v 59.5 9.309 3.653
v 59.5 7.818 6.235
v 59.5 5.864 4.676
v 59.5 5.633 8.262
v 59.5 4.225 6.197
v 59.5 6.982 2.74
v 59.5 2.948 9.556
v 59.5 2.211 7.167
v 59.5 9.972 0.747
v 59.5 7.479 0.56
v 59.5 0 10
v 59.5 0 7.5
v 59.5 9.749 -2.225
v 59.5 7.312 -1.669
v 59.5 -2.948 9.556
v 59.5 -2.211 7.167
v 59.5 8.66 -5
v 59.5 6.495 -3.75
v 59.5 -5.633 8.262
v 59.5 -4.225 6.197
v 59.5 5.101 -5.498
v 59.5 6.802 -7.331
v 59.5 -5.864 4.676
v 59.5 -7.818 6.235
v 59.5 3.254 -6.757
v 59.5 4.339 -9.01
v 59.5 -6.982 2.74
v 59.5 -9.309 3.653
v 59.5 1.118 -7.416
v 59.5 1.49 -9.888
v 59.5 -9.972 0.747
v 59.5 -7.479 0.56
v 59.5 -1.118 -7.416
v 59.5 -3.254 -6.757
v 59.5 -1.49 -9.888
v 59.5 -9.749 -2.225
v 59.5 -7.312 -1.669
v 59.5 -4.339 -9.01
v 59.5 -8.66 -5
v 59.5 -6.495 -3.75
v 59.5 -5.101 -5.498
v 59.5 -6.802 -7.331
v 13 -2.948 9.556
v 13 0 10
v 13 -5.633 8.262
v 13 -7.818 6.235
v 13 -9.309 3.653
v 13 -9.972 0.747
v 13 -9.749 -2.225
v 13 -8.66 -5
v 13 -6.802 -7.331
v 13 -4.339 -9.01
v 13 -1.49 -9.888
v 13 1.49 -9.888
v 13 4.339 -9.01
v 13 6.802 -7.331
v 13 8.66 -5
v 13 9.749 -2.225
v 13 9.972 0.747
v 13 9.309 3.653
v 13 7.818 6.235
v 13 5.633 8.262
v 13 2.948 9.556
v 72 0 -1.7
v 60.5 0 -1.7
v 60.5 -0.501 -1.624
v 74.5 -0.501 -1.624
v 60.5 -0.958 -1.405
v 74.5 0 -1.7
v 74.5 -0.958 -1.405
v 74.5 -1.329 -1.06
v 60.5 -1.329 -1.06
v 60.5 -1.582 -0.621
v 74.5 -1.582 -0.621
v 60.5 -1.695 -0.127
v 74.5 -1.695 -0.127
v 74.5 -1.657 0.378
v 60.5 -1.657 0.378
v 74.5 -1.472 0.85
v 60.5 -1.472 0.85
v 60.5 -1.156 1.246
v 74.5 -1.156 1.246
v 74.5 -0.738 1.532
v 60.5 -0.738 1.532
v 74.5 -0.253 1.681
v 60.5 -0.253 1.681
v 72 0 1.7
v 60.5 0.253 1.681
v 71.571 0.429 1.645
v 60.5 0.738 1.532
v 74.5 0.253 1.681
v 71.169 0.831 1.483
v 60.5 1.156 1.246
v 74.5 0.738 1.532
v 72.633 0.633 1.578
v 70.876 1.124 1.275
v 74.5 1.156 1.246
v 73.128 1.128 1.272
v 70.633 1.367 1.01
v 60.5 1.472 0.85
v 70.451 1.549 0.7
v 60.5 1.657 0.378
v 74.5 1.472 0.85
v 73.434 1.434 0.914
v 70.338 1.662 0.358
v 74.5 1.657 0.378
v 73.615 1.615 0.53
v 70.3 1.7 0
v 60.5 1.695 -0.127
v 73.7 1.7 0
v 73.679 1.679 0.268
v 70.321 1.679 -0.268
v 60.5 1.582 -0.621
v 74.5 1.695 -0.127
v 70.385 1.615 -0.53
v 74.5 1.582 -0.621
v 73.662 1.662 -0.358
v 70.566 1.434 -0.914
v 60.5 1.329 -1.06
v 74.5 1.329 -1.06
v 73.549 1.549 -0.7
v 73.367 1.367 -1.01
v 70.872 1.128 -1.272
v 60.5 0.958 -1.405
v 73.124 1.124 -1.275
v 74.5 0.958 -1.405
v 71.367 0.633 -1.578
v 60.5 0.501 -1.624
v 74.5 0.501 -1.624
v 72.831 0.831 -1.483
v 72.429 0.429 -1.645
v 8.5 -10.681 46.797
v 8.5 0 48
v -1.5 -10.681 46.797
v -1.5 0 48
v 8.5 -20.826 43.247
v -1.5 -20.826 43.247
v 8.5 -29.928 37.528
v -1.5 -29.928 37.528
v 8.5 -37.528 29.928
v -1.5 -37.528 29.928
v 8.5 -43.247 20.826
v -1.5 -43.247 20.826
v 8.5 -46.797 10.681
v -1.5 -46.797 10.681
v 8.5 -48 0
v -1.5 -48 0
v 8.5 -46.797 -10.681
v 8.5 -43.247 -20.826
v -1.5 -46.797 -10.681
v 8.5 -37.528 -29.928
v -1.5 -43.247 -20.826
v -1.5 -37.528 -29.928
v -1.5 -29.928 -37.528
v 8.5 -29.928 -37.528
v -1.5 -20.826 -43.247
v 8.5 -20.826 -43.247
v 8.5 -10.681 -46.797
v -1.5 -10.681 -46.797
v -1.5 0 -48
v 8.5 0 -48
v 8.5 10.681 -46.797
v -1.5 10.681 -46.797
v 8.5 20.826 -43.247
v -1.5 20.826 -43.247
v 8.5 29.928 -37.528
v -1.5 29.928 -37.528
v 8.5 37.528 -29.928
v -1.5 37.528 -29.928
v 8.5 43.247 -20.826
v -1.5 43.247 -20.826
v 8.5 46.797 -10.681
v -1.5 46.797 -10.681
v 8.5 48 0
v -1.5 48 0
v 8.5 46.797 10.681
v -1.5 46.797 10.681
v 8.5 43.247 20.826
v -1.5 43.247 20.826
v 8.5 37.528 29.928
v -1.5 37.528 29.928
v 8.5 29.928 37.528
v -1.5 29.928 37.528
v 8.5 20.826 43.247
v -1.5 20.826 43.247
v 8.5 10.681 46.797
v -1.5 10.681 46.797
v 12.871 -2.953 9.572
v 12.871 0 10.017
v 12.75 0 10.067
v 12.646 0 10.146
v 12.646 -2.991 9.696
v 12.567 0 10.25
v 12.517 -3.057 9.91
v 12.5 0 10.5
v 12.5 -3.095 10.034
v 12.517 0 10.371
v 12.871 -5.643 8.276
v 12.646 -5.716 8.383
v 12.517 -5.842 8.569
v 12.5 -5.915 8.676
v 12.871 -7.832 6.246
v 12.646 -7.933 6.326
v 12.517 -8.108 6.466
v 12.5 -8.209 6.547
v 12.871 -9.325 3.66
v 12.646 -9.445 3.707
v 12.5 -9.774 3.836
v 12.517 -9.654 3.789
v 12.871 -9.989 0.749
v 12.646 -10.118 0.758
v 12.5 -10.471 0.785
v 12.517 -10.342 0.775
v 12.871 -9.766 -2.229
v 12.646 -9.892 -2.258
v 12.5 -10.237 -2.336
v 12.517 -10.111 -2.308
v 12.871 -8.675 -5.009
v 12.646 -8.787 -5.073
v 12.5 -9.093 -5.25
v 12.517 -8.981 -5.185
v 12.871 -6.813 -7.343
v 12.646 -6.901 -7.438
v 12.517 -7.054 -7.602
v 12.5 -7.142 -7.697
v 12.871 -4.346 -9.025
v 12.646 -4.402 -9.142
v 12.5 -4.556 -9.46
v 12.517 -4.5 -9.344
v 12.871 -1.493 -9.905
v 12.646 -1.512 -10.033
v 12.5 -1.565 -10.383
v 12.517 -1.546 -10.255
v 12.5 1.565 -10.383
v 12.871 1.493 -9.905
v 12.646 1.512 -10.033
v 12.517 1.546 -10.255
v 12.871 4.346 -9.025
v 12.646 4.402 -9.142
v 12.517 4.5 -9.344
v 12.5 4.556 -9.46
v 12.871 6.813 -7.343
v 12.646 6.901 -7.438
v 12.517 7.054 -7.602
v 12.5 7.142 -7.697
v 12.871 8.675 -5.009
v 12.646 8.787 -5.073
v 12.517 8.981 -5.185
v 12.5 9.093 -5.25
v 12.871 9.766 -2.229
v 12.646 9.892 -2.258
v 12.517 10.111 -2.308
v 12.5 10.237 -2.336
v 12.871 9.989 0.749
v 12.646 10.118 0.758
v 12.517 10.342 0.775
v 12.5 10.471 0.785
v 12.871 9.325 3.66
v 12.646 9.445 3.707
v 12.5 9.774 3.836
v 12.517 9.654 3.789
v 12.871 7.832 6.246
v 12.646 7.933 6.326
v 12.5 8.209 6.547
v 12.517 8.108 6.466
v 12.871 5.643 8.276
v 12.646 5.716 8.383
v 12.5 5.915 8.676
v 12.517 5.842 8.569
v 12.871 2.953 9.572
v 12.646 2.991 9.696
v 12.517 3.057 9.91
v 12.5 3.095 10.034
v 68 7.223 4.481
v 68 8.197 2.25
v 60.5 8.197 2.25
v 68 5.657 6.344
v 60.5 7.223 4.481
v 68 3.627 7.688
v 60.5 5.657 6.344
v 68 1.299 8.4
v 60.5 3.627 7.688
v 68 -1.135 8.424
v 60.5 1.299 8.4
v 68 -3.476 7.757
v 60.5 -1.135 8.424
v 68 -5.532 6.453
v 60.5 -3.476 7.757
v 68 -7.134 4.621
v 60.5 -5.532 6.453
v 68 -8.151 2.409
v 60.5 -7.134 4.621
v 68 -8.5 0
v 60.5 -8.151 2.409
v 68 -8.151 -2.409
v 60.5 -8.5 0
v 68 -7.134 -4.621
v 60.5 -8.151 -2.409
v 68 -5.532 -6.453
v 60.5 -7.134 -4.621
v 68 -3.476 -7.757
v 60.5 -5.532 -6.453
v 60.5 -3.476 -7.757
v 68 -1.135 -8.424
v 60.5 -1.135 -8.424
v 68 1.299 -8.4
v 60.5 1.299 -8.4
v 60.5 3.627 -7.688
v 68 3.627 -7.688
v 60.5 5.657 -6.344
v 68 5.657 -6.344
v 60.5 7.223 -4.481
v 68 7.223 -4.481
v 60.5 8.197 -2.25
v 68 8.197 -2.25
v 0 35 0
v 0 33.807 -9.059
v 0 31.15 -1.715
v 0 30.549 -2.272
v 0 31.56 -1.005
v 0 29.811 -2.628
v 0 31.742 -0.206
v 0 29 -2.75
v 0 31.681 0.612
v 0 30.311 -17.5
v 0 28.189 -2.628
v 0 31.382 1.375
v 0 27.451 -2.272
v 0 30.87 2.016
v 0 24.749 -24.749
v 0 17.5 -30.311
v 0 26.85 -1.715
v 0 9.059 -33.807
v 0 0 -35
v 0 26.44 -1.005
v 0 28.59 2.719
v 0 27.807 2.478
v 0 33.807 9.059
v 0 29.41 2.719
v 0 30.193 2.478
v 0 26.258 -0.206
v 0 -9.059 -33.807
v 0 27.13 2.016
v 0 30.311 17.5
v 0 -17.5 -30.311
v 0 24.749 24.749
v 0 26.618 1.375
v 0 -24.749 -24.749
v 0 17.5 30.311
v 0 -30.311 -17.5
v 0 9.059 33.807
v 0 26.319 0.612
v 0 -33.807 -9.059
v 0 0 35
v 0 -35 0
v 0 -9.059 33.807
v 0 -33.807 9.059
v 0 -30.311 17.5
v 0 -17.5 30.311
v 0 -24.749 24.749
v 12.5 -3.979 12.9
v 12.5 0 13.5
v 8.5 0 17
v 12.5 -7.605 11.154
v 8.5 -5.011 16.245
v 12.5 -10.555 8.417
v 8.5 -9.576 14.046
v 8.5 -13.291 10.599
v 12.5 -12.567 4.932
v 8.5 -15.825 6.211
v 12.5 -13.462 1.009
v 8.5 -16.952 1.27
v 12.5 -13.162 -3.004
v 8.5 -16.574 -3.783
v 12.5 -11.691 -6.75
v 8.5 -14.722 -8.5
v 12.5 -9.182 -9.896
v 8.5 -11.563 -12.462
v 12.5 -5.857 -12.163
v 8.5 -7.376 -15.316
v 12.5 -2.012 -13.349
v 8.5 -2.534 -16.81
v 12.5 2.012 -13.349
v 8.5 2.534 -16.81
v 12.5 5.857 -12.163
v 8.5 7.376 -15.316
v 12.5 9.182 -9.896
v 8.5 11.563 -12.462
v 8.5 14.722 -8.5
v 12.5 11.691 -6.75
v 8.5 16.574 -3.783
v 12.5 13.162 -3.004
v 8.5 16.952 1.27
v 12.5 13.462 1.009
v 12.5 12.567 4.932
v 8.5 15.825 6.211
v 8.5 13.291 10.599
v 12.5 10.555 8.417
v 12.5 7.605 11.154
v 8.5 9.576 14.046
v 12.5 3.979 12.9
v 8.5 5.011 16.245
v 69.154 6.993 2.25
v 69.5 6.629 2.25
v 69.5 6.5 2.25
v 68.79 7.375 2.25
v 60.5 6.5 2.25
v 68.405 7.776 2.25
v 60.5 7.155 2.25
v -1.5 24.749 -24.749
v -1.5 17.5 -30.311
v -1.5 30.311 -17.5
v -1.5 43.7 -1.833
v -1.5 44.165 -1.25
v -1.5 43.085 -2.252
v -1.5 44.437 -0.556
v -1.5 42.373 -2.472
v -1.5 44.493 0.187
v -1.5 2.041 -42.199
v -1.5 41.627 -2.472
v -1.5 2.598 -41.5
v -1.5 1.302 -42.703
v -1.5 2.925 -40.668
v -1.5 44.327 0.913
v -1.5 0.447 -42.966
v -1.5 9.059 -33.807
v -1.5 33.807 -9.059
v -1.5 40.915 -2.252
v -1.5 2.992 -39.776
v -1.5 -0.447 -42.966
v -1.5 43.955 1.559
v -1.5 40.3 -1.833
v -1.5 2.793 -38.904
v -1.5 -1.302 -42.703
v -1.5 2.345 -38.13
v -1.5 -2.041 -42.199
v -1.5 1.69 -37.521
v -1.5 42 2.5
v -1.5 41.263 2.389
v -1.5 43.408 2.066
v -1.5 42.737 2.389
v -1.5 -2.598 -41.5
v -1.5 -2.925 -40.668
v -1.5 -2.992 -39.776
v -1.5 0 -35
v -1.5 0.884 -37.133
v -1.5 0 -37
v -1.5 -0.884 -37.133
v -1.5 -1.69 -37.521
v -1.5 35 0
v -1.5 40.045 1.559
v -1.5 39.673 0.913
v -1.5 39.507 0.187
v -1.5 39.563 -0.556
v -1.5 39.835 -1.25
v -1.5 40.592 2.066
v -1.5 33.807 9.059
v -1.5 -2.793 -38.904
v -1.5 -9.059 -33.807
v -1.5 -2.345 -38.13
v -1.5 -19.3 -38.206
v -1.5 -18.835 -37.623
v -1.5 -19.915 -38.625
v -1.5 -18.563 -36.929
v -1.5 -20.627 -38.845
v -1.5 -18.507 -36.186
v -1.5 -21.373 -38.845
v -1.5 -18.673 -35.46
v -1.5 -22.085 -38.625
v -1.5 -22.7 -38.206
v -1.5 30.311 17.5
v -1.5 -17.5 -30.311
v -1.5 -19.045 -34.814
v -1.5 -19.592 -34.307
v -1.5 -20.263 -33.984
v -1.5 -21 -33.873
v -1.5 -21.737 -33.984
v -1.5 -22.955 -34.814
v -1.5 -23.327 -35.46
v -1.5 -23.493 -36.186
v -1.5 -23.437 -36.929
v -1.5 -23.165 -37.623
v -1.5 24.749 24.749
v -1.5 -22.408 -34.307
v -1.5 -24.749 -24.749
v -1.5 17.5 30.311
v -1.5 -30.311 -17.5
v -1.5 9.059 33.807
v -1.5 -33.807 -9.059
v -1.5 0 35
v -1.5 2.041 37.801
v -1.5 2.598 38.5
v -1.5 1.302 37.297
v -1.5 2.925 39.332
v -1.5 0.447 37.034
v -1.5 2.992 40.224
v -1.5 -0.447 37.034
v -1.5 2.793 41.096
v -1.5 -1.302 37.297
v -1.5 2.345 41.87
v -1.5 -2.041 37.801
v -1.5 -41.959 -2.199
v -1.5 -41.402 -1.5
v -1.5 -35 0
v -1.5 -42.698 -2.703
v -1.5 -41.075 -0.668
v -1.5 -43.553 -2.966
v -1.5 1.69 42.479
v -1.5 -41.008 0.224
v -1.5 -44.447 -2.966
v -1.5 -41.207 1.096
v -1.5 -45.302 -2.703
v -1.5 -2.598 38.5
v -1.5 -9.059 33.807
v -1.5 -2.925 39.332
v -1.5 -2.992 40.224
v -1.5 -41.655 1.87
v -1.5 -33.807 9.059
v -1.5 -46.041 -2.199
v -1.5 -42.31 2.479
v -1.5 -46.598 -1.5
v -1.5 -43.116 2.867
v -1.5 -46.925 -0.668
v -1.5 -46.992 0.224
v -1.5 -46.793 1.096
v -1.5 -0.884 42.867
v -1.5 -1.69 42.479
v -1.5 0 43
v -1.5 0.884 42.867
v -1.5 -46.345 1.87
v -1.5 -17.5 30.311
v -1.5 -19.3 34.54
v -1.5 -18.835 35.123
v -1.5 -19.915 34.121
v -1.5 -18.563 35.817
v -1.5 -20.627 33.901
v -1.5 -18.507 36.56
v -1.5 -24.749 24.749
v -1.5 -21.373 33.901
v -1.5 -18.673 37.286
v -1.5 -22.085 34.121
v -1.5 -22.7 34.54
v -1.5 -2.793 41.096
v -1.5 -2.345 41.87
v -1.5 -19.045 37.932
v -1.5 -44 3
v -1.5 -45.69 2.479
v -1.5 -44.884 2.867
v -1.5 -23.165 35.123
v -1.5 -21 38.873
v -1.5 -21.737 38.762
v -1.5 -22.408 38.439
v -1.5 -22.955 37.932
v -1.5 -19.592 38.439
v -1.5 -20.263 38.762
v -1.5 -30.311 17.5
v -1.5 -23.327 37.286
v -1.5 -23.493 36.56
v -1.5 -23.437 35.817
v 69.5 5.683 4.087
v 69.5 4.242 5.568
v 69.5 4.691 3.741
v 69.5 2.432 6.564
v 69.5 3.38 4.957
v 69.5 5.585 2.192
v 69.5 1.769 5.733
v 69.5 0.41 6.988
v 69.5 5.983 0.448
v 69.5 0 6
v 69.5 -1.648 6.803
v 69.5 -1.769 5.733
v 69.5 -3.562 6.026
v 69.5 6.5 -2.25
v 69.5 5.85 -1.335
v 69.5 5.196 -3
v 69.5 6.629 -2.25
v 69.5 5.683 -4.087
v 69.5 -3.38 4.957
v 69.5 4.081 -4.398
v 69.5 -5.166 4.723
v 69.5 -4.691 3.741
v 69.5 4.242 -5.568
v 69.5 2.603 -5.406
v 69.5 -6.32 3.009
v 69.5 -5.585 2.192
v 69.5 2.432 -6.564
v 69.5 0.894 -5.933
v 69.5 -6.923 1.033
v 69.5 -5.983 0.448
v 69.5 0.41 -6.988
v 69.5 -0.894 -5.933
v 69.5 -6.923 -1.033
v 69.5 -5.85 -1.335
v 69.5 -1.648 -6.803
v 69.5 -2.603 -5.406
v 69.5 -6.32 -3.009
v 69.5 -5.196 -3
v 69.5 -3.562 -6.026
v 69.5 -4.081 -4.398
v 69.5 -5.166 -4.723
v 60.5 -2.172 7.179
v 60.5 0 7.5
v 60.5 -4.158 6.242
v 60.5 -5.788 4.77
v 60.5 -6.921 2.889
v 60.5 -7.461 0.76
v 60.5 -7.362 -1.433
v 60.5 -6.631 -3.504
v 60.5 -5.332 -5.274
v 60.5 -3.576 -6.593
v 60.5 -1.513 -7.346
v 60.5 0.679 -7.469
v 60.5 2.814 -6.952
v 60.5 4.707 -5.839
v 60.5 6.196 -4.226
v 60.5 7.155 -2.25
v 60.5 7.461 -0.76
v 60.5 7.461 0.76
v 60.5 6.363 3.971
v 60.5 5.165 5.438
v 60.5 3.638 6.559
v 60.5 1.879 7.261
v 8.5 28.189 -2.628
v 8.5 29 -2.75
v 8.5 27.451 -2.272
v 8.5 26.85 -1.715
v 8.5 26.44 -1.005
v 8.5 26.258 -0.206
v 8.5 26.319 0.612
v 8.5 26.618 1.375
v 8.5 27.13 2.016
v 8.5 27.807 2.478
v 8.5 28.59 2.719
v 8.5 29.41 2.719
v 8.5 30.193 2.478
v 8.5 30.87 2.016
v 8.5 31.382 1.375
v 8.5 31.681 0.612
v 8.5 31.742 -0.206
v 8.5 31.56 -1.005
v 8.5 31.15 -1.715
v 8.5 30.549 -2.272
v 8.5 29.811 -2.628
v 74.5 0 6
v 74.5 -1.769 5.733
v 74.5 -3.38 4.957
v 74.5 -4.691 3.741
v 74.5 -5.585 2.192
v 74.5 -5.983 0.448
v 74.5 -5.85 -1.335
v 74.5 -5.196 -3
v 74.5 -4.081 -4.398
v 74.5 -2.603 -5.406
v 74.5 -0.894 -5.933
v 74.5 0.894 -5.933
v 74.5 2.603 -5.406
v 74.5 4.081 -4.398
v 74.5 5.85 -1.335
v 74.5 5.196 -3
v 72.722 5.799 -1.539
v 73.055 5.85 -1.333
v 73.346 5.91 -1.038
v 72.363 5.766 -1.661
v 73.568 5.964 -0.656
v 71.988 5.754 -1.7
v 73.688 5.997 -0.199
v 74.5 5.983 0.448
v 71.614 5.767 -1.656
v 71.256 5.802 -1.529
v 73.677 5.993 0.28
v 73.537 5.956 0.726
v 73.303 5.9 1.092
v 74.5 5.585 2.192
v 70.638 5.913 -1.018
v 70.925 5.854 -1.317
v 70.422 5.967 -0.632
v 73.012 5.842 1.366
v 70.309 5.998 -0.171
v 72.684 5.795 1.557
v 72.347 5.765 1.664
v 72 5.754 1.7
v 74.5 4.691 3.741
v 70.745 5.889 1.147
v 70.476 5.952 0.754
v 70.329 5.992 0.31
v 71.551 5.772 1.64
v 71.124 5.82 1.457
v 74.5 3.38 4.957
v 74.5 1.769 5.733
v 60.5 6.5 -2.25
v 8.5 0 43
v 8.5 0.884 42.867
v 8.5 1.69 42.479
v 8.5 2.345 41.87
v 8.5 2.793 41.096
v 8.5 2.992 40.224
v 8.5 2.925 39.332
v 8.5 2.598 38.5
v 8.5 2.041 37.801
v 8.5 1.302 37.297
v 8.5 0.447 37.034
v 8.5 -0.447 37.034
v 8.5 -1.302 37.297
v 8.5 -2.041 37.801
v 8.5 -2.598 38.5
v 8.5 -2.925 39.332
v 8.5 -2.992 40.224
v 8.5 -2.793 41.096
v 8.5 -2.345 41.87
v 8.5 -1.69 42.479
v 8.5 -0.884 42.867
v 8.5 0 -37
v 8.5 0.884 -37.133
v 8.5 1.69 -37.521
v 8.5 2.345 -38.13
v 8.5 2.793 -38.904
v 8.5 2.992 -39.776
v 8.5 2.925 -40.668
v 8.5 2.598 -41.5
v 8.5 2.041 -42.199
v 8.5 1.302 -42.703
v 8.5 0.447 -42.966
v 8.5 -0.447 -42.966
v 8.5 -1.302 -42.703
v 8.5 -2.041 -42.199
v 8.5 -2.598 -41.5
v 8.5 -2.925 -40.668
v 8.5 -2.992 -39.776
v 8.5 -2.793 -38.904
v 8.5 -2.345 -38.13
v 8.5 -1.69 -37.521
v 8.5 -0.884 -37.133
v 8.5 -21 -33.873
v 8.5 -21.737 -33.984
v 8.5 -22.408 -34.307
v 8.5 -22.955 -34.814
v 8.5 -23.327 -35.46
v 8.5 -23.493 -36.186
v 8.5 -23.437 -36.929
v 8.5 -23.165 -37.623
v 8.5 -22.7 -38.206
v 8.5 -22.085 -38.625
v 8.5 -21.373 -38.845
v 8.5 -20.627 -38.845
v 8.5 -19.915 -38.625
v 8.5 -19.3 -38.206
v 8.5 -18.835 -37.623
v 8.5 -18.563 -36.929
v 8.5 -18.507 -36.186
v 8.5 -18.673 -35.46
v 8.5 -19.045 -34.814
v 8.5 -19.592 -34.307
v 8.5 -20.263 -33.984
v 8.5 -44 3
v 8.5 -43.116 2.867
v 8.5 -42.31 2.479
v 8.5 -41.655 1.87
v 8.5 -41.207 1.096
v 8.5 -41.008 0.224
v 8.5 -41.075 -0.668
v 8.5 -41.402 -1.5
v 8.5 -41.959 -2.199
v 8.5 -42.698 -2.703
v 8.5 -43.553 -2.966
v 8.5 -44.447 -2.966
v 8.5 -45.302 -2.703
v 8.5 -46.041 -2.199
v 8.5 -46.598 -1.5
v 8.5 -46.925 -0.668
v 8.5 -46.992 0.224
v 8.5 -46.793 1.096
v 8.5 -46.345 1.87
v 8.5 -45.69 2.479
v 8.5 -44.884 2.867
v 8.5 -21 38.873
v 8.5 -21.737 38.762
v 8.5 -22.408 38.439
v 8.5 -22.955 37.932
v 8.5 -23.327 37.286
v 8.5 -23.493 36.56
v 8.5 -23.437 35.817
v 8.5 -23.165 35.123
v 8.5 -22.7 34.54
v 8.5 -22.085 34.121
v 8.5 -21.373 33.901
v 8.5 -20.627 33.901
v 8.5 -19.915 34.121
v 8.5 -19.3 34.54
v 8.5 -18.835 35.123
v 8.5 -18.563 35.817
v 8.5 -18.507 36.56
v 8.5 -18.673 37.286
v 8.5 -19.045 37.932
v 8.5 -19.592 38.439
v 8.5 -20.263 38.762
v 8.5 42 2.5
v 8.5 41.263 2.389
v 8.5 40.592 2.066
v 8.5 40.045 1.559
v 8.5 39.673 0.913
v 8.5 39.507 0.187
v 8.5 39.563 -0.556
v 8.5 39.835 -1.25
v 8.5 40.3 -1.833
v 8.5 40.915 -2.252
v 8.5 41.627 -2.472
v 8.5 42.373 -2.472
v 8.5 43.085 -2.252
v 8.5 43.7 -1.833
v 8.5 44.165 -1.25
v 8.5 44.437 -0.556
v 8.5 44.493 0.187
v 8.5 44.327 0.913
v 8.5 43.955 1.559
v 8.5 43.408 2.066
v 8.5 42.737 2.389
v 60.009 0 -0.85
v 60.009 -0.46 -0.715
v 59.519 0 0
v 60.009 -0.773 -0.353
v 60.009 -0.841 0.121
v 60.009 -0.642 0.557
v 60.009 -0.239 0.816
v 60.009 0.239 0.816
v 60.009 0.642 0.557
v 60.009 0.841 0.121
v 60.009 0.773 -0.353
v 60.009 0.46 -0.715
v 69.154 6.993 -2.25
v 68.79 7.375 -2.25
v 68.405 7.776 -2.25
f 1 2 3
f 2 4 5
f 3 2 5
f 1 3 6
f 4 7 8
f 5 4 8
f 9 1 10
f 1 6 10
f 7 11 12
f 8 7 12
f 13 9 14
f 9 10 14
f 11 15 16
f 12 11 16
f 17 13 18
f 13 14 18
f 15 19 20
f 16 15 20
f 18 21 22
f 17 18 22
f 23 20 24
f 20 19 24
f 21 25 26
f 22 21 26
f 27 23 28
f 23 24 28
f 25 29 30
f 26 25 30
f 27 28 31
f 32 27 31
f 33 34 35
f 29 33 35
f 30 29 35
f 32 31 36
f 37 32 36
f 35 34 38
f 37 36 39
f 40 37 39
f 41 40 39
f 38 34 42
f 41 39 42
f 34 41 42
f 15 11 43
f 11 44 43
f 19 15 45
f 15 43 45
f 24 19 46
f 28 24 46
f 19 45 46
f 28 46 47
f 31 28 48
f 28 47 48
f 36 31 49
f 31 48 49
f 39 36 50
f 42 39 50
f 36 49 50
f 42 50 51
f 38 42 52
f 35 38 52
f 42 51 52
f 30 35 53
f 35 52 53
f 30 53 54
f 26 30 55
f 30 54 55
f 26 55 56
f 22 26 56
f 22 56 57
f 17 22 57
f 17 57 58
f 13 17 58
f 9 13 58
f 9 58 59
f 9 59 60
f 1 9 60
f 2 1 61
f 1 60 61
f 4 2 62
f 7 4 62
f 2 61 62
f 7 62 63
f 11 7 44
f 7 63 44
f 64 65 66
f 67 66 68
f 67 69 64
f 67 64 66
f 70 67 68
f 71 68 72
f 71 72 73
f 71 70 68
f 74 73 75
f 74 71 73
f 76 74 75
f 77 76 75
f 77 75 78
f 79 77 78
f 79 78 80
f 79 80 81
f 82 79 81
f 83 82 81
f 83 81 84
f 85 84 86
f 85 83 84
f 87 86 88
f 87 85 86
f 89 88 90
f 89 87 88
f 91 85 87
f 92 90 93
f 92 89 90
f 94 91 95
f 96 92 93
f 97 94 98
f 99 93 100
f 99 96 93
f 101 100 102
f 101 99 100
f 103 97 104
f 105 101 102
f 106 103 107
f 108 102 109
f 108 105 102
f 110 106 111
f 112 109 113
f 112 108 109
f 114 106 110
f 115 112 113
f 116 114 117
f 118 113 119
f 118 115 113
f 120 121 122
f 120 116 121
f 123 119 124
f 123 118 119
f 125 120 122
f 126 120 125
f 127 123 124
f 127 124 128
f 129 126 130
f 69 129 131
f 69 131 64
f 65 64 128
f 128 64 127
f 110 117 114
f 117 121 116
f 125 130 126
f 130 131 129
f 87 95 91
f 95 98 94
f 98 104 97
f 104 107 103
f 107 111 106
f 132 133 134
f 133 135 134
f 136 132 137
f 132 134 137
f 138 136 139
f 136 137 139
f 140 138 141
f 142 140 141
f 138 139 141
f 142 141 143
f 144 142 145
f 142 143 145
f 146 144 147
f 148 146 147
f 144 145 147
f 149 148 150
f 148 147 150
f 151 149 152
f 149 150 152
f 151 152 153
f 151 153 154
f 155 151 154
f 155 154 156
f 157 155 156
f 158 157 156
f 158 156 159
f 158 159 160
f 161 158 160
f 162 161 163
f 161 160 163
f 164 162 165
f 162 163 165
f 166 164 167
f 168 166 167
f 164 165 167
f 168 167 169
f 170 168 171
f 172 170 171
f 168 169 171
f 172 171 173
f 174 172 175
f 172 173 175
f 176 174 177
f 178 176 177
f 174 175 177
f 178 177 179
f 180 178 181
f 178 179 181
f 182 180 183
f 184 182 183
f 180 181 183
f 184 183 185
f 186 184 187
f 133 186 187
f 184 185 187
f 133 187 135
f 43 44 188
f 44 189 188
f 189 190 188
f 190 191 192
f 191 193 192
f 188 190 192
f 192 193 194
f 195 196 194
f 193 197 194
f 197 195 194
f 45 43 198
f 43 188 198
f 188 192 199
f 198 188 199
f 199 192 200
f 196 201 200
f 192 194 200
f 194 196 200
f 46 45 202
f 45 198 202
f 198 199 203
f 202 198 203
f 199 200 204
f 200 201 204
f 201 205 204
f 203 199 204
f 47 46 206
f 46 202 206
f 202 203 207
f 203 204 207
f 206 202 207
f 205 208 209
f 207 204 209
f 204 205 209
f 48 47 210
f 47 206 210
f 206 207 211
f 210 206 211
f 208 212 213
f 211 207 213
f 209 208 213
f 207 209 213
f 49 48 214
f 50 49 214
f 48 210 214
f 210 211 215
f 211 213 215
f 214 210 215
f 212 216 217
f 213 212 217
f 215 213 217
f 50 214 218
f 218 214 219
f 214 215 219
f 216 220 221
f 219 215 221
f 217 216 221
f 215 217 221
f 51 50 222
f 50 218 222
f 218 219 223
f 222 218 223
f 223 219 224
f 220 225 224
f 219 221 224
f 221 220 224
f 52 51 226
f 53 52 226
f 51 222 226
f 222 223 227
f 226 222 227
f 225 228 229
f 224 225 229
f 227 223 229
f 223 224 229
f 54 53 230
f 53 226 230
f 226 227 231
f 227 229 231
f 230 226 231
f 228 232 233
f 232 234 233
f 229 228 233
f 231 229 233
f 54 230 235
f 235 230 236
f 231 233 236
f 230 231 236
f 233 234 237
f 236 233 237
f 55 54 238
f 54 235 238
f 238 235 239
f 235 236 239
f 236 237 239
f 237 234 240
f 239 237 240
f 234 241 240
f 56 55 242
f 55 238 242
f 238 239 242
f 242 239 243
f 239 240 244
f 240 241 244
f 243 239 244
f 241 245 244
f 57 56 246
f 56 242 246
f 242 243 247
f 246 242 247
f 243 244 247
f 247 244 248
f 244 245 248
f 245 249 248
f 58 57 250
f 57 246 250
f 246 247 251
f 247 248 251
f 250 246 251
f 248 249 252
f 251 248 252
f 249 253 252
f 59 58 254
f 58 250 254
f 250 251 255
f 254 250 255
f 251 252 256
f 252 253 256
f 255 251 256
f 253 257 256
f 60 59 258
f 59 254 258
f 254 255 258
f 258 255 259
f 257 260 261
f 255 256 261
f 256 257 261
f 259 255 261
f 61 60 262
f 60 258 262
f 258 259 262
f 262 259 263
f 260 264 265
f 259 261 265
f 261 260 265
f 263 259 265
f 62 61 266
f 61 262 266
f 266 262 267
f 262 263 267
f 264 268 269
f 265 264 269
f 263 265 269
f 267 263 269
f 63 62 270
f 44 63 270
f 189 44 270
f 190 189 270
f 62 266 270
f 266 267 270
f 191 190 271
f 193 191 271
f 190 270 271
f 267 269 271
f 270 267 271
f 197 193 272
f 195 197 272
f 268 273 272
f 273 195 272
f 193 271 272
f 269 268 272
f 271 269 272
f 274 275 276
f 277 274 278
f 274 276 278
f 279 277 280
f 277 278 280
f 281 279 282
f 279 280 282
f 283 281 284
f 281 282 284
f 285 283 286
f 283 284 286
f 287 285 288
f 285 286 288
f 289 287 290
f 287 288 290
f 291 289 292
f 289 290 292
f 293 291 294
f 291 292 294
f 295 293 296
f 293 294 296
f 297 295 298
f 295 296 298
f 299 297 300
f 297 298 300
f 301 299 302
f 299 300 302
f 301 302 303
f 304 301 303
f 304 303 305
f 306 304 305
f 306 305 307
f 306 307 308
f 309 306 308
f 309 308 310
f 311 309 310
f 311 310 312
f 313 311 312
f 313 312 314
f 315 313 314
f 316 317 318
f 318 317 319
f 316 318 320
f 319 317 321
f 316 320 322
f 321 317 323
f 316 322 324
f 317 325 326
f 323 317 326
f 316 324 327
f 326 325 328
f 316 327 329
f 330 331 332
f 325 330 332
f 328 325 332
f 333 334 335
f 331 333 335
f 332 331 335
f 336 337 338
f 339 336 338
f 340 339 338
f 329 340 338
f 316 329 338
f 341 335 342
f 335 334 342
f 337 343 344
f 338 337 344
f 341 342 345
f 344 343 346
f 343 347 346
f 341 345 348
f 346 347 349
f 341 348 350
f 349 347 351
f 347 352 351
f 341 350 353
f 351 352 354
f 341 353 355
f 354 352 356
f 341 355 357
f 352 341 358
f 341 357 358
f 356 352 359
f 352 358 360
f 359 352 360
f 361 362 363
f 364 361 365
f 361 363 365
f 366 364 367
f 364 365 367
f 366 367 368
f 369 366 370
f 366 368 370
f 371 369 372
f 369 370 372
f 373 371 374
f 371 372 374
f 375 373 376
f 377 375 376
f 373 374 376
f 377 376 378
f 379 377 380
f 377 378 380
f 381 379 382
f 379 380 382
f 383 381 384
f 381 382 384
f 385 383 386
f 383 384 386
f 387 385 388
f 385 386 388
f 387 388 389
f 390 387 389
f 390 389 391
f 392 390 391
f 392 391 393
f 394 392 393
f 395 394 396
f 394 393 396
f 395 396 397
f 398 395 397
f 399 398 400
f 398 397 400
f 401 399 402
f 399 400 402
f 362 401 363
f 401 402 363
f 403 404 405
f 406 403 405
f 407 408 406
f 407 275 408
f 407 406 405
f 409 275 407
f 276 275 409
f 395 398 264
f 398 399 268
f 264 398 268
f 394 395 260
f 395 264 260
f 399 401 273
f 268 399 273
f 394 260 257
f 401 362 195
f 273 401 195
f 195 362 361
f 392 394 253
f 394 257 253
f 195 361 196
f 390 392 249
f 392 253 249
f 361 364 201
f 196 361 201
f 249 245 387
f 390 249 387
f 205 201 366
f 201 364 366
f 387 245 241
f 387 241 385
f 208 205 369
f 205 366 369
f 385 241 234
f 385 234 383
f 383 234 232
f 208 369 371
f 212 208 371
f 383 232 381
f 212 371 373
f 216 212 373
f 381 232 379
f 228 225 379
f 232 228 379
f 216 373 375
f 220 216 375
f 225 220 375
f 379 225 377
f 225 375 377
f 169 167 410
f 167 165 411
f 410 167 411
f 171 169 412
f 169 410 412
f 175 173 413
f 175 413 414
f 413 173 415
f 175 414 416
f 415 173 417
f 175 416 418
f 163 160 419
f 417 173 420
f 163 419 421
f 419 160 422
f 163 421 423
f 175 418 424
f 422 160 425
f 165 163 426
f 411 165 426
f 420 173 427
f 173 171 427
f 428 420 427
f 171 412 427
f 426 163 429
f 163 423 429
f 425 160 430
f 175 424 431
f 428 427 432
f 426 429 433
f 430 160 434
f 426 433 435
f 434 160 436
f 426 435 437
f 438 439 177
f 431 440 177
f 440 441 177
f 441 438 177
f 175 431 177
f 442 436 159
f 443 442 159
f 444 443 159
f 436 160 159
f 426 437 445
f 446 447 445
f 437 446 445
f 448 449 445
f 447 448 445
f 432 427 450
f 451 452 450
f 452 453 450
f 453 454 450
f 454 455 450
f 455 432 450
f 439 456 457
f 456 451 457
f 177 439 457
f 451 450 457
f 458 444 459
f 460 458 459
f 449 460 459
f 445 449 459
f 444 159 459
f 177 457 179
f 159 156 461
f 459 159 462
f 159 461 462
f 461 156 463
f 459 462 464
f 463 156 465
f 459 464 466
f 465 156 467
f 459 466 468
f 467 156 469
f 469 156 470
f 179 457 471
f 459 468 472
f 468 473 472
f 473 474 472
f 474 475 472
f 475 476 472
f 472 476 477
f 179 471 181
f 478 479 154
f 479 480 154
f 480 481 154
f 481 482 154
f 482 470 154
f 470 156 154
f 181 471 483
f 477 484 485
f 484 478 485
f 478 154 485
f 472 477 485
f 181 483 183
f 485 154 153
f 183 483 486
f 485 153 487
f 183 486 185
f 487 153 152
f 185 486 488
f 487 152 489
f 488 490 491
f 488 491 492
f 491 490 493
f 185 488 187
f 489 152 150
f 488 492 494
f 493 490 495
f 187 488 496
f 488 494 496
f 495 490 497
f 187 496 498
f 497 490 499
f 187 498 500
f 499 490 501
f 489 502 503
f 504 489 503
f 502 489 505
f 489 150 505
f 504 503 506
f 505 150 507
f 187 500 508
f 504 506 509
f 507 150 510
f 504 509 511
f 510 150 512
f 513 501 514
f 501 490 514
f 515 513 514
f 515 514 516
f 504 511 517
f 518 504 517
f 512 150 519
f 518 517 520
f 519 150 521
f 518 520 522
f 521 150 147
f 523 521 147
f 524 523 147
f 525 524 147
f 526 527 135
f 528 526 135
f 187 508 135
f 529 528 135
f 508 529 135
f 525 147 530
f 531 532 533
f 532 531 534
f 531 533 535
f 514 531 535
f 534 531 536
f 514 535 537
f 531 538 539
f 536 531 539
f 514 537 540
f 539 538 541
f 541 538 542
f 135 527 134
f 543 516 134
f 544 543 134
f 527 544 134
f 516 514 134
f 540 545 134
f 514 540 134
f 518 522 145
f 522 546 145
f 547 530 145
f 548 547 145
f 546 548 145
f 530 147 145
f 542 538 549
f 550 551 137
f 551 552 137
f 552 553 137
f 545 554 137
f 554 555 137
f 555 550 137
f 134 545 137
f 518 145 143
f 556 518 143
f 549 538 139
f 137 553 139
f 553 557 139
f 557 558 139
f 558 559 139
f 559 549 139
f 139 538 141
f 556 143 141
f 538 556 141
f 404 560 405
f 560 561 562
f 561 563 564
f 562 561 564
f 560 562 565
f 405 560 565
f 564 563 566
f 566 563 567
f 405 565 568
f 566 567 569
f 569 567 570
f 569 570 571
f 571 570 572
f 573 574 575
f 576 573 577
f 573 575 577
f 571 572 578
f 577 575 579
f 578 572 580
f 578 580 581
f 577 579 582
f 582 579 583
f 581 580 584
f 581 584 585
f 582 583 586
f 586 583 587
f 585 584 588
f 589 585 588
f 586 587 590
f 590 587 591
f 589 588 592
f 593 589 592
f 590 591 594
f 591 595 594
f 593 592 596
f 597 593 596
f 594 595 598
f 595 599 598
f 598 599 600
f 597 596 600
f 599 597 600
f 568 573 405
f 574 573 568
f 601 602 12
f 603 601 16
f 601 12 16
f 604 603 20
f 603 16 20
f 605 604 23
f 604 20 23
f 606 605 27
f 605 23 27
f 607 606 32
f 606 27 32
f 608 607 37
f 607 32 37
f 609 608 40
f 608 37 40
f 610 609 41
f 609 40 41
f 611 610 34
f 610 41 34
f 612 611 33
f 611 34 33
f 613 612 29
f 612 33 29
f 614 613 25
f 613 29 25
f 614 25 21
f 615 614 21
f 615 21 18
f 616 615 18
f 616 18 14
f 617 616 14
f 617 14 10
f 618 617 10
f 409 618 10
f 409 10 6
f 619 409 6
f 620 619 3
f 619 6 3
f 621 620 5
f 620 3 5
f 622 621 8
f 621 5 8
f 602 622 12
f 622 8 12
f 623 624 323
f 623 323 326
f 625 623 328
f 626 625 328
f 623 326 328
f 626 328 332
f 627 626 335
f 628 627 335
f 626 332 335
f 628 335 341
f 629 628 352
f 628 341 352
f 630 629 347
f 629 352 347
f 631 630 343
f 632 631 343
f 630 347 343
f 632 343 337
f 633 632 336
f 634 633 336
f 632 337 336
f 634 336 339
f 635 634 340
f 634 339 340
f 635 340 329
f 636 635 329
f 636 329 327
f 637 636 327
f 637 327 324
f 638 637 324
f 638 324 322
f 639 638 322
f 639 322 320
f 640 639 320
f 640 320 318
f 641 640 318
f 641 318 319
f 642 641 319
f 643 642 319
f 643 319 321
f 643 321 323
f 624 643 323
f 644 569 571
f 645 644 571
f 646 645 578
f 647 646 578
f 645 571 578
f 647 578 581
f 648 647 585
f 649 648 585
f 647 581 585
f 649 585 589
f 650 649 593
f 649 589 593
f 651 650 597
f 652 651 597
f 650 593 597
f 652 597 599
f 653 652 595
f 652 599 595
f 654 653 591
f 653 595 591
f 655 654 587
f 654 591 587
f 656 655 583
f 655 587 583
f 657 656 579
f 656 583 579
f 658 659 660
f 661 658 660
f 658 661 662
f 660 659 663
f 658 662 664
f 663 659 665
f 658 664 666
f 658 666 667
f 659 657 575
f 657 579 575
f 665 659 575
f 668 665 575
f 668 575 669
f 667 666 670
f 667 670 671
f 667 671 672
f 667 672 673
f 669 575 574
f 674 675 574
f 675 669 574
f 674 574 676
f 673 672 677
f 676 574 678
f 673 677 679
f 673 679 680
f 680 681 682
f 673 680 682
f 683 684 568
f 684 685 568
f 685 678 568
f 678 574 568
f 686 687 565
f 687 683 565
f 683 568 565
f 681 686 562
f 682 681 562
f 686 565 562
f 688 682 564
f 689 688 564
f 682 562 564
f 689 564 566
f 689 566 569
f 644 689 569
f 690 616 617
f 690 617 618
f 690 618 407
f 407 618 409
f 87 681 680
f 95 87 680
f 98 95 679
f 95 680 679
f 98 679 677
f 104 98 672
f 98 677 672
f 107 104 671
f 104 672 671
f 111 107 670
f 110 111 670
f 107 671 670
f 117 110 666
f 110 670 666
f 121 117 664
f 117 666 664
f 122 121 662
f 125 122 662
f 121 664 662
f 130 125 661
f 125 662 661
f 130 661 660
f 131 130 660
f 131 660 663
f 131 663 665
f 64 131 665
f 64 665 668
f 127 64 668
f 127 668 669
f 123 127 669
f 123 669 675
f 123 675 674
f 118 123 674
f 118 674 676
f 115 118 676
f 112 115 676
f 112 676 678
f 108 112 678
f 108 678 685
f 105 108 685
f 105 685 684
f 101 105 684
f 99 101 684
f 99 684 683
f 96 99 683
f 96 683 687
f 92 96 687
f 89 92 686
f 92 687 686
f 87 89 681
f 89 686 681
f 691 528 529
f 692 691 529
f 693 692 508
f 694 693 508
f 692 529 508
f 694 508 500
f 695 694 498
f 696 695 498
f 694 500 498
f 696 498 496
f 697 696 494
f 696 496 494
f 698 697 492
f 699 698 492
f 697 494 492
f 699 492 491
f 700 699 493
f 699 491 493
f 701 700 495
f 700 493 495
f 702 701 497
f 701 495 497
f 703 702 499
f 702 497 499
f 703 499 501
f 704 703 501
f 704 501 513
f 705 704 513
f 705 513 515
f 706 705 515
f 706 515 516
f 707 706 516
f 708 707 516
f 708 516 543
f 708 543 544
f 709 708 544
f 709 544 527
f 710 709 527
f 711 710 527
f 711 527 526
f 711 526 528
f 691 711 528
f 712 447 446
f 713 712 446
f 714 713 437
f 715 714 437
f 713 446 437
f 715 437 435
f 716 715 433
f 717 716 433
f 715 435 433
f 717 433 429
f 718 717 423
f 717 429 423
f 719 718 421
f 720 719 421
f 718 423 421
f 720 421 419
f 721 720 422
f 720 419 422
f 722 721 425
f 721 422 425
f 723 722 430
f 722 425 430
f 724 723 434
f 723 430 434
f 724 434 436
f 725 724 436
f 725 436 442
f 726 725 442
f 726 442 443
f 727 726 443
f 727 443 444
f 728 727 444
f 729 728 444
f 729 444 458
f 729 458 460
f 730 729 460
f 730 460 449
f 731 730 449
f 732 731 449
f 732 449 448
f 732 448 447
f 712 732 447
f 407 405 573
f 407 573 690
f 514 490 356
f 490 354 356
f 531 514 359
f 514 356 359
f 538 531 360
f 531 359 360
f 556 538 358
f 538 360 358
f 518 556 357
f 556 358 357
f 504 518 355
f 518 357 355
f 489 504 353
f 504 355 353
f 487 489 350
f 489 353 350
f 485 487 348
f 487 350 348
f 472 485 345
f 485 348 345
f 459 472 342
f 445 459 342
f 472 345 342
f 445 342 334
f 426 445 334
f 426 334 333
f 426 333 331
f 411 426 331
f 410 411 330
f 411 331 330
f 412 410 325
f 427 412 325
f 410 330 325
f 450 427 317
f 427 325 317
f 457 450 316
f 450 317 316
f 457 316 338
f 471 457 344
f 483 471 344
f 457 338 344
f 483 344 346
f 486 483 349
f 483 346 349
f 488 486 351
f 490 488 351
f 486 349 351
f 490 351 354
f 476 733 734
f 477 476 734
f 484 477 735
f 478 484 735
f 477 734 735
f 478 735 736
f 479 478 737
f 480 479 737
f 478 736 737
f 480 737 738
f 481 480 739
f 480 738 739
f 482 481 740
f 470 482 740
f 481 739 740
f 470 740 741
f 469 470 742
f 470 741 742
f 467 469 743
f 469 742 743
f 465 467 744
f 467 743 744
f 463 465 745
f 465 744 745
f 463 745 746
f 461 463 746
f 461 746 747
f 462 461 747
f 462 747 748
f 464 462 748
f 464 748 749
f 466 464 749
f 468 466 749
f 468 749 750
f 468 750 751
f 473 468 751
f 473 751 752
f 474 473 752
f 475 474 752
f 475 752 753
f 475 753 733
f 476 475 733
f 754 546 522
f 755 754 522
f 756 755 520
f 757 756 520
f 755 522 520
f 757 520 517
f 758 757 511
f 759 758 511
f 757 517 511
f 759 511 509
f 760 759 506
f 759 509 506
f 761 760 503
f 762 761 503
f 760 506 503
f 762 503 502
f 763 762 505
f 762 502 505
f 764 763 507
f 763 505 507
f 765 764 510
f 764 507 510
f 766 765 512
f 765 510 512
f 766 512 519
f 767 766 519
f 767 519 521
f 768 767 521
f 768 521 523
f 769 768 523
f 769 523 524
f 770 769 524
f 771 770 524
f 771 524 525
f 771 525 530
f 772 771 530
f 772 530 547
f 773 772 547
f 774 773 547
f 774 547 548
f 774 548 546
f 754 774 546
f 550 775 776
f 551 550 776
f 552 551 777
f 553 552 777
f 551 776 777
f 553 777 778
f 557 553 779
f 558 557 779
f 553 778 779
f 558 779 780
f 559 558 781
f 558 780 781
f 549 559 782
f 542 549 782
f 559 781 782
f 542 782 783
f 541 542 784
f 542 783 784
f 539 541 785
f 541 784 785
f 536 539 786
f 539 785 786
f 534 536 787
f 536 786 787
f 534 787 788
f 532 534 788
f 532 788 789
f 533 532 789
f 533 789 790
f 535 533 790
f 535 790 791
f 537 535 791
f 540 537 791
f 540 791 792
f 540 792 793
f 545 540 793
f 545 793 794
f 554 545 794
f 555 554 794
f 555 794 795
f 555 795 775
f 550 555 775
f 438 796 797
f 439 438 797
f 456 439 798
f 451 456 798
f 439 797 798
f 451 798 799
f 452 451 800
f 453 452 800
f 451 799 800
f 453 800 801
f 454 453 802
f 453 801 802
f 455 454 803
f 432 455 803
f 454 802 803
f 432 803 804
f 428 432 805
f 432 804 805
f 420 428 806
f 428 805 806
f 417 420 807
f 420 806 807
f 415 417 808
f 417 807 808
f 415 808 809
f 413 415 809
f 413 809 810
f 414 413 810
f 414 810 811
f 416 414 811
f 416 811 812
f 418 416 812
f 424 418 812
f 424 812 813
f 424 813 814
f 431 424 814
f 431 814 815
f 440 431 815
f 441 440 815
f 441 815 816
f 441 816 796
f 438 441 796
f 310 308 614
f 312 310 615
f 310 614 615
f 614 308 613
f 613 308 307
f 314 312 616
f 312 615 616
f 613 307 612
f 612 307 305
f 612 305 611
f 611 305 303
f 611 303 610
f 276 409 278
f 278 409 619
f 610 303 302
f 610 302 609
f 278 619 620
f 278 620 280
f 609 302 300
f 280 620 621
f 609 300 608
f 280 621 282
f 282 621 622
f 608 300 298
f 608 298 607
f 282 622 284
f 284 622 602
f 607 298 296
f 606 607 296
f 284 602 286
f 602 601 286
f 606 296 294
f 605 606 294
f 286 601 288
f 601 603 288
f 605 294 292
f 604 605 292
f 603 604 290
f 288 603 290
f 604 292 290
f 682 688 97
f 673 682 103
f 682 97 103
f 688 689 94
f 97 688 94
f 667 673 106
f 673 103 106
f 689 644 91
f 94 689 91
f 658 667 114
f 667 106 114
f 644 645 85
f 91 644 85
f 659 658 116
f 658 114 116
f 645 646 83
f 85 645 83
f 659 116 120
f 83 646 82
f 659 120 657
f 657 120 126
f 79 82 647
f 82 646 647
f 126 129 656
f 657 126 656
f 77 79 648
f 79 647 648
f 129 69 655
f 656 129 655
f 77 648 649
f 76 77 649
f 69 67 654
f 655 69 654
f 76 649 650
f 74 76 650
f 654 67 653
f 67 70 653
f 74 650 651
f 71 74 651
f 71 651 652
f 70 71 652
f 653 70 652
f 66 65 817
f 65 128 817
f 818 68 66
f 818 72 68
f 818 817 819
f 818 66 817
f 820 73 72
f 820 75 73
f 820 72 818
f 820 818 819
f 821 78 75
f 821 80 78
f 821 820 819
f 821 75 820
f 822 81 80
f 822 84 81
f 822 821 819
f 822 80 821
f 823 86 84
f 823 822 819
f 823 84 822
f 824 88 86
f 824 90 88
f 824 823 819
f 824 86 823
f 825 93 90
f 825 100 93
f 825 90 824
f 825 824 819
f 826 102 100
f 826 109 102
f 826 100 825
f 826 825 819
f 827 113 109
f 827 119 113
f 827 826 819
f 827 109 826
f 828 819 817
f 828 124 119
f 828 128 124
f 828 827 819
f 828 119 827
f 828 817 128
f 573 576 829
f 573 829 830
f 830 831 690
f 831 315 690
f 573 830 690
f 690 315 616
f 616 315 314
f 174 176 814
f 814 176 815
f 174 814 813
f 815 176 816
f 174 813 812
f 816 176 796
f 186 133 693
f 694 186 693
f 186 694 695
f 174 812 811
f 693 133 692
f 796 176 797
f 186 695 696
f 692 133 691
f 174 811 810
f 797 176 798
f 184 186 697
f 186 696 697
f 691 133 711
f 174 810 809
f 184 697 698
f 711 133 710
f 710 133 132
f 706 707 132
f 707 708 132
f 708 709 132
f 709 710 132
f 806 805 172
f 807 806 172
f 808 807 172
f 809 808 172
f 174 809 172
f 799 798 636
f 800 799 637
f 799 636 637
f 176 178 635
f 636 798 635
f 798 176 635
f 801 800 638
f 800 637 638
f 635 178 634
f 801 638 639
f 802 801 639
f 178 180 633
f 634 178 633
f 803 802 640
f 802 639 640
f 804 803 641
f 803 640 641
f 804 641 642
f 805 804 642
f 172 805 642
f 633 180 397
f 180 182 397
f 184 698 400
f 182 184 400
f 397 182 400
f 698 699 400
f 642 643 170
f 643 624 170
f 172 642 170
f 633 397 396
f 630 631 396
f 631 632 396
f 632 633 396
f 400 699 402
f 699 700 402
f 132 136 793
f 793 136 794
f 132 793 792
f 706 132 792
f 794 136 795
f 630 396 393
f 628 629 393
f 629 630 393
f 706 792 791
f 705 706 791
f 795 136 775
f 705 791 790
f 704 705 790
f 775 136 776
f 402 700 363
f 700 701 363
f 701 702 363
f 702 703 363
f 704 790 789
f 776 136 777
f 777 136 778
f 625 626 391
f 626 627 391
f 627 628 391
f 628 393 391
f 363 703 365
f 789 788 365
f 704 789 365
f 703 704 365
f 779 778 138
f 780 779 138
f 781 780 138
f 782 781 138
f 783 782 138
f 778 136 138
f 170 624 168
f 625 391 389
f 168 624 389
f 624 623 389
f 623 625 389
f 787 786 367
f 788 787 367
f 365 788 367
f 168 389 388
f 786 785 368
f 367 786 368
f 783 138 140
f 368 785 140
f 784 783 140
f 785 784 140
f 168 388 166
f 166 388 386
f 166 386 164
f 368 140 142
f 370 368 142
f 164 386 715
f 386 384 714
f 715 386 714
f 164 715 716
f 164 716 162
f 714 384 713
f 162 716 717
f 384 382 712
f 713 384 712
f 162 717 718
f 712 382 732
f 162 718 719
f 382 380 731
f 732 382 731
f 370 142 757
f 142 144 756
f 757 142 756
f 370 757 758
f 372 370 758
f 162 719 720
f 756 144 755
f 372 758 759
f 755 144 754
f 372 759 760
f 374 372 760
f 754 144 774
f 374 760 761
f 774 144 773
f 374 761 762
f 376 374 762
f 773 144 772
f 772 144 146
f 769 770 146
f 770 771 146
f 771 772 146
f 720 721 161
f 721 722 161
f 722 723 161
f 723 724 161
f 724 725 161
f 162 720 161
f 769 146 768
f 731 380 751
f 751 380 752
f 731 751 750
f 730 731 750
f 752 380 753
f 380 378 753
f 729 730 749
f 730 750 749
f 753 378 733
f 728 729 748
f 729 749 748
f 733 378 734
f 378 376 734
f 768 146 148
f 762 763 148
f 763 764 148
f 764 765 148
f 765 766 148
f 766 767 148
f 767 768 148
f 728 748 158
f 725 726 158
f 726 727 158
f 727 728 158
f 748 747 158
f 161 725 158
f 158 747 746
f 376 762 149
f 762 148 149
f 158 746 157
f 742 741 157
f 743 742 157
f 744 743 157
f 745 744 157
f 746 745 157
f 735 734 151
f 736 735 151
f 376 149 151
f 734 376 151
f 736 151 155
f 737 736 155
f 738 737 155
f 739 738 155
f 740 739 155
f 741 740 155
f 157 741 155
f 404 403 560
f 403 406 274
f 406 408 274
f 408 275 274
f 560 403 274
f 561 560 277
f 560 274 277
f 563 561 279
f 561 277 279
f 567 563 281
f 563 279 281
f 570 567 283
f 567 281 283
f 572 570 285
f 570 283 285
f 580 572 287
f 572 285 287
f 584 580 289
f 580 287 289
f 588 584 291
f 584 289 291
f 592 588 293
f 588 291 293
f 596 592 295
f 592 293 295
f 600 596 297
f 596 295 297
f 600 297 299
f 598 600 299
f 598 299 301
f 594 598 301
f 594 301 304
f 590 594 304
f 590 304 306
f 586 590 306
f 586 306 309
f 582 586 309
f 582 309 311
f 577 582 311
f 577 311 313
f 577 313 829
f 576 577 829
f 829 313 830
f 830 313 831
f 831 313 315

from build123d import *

# Parameters (mm, degrees)
ESQUISSE3_R             = 3
ENL_V_MAT_EXTRU_1_DEPTH = 102.901913623
ESQUISSE7_R             = 3
ENL_V_MAT_EXTRU_2_DEPTH = 102.901913623
TROU_TARAUD_M63_D       = 5
TROU_TARAUD_M63_DEPTH   = 15
TROU_TARAUD_M63_TIP     = 1.502151548
D_GAGEMENT_M37_REACH    = 105.064
D_GAGEMENT_M37_BORE_R   = 1.7
ESQUISSE6_W             = 10.447703872
ESQUISSE6_H             = 4.5
ENL_V_MAT_EXTRU_3_DEPTH = 2
D_GAGEMENT_M51_D        = 5.5
D_GAGEMENT_M51_DEPTH    = 12
D_GAGEMENT_M51_TIP      = 1.652366702


with BuildPart() as part:
    # Esquisse1 → Révolution2 (revolve)
    with BuildSketch(Plane.XY, mode=Mode.PRIVATE) as r_volution2_sk:
        with BuildLine():
            Line((0, 0), (74.5, 0))
            Line((74.5, 0), (74.5, -6))
            Line((74.5, -6), (69.5, -6))
            Line((69.5, -6), (69.5, -7))
            Line((69.5, -7), (68, -8.5))
            Line((68, -8.5), (60.5, -8.5))
            Line((60.5, -8.5), (60.5, -7.5))
            Line((60.5, -7.5), (59.5, -7.5))
            Line((59.5, -7.5), (59.5, -10))
            Line((59.5, -10), (13, -10))
            ThreePointArc((13, -10), (12.646446609, -10.146446609), (12.5, -10.5))
            Line((12.5, -10.5), (12.5, -13.5))
            Line((12.5, -13.5), (8.5, -17))
            Line((8.5, -17), (8.5, -48))
            Line((8.5, -48), (-1.5, -48))
            Line((-1.5, -48), (-1.5, -35))
            Line((-1.5, -35), (0, -35))
            Line((0, -35), (0, 0))
        make_face()
    revolve(r_volution2_sk.sketch.rotate(Axis((-50.843487897, 0, 0), (1, 0, 0)), 270), axis=Axis((-50.843487897, 0, 0), (1, 0, 0)))

    # Esquisse2 → Dégagement M32 (revolve, cut)
    with BuildSketch(Plane(origin=(74.5, 0, 0), x_dir=(0, 0, -1), z_dir=(0, 1, 0))):
        Polygon((0, 0), (0, 14.981495458), (1.7, 14), (1.7, 0), align=None)
    revolve(axis=Axis((80.85, 0, 0), (-1, 0, 0)), mode=Mode.SUBTRACT)

    # Esquisse3 → Enlèv. mat.-Extru.1 (cut, through all)
    with BuildSketch(Plane.ZY.offset(1.5)):
        with Locations((-40, 0)):
            Circle(ESQUISSE3_R)
        with Locations((40, 0)):
            Circle(ESQUISSE3_R)
    extrude(amount=-ENL_V_MAT_EXTRU_1_DEPTH, mode=Mode.SUBTRACT)

    # Esquisse7 → Enlèv. mat.-Extru.2 (cut, through all)
    with BuildSketch(Plane.ZY.offset(1.5)):
        with Locations((0, -44)):
            Circle(ESQUISSE7_R)
    extrude(amount=-ENL_V_MAT_EXTRU_2_DEPTH, mode=Mode.SUBTRACT)

    # Trou taraudé M63
    with Locations(Plane(origin=(-1.5, 42, 0), x_dir=(0, 0, -1), z_dir=(-1, 0, 0))):
        with Locations((0, 0), (36.373066959, 63), (-36.373066959, 63)):
            Hole(TROU_TARAUD_M63_D / 2, depth=TROU_TARAUD_M63_DEPTH)
            with Locations((0, 0, -(TROU_TARAUD_M63_DEPTH + TROU_TARAUD_M63_TIP / 2))):  # 118° drill point
                Cone(0, TROU_TARAUD_M63_D / 2, TROU_TARAUD_M63_TIP, mode=Mode.SUBTRACT)

    # Dégagement M37 bore (on position points) → Dégagement M37 (cut, up to next)
    with BuildSketch(Plane(origin=(72, 6, 0), x_dir=(0, 0, 1), z_dir=(0, 1, 0)), mode=Mode.PRIVATE) as d_gagement_m37_sk1:
        Circle(D_GAGEMENT_M37_BORE_R)
    d_gagement_m37_tool1 = extrude(d_gagement_m37_sk1.sketch, amount=-D_GAGEMENT_M37_REACH, mode=Mode.PRIVATE) & part.part
    add(d_gagement_m37_tool1.solids().sort_by_distance((72, 6, 0))[0], mode=Mode.SUBTRACT)

    # Esquisse6 → Enlèv. mat.-Extru.3 (cut)
    with BuildSketch(Plane(origin=(0, 8.5, 0), x_dir=(-1, 0, 0), z_dir=(0, 1, 0))):
        with Locations((-65.723851936, 0)):
            Rectangle(ESQUISSE6_W, ESQUISSE6_H)
    extrude(amount=-ENL_V_MAT_EXTRU_3_DEPTH, mode=Mode.SUBTRACT)

    # Dégagement M51
    with Locations(Plane(origin=(8.5, 29, 0), x_dir=(0, 0, 1), z_dir=(1, 0, 0))):
        with Locations((0, 0)):
            Hole(D_GAGEMENT_M51_D / 2, depth=D_GAGEMENT_M51_DEPTH)
            with Locations((0, 0, -(D_GAGEMENT_M51_DEPTH + D_GAGEMENT_M51_TIP / 2))):  # 118° drill point
                Cone(0, D_GAGEMENT_M51_D / 2, D_GAGEMENT_M51_TIP, mode=Mode.SUBTRACT)


solid = part.part
